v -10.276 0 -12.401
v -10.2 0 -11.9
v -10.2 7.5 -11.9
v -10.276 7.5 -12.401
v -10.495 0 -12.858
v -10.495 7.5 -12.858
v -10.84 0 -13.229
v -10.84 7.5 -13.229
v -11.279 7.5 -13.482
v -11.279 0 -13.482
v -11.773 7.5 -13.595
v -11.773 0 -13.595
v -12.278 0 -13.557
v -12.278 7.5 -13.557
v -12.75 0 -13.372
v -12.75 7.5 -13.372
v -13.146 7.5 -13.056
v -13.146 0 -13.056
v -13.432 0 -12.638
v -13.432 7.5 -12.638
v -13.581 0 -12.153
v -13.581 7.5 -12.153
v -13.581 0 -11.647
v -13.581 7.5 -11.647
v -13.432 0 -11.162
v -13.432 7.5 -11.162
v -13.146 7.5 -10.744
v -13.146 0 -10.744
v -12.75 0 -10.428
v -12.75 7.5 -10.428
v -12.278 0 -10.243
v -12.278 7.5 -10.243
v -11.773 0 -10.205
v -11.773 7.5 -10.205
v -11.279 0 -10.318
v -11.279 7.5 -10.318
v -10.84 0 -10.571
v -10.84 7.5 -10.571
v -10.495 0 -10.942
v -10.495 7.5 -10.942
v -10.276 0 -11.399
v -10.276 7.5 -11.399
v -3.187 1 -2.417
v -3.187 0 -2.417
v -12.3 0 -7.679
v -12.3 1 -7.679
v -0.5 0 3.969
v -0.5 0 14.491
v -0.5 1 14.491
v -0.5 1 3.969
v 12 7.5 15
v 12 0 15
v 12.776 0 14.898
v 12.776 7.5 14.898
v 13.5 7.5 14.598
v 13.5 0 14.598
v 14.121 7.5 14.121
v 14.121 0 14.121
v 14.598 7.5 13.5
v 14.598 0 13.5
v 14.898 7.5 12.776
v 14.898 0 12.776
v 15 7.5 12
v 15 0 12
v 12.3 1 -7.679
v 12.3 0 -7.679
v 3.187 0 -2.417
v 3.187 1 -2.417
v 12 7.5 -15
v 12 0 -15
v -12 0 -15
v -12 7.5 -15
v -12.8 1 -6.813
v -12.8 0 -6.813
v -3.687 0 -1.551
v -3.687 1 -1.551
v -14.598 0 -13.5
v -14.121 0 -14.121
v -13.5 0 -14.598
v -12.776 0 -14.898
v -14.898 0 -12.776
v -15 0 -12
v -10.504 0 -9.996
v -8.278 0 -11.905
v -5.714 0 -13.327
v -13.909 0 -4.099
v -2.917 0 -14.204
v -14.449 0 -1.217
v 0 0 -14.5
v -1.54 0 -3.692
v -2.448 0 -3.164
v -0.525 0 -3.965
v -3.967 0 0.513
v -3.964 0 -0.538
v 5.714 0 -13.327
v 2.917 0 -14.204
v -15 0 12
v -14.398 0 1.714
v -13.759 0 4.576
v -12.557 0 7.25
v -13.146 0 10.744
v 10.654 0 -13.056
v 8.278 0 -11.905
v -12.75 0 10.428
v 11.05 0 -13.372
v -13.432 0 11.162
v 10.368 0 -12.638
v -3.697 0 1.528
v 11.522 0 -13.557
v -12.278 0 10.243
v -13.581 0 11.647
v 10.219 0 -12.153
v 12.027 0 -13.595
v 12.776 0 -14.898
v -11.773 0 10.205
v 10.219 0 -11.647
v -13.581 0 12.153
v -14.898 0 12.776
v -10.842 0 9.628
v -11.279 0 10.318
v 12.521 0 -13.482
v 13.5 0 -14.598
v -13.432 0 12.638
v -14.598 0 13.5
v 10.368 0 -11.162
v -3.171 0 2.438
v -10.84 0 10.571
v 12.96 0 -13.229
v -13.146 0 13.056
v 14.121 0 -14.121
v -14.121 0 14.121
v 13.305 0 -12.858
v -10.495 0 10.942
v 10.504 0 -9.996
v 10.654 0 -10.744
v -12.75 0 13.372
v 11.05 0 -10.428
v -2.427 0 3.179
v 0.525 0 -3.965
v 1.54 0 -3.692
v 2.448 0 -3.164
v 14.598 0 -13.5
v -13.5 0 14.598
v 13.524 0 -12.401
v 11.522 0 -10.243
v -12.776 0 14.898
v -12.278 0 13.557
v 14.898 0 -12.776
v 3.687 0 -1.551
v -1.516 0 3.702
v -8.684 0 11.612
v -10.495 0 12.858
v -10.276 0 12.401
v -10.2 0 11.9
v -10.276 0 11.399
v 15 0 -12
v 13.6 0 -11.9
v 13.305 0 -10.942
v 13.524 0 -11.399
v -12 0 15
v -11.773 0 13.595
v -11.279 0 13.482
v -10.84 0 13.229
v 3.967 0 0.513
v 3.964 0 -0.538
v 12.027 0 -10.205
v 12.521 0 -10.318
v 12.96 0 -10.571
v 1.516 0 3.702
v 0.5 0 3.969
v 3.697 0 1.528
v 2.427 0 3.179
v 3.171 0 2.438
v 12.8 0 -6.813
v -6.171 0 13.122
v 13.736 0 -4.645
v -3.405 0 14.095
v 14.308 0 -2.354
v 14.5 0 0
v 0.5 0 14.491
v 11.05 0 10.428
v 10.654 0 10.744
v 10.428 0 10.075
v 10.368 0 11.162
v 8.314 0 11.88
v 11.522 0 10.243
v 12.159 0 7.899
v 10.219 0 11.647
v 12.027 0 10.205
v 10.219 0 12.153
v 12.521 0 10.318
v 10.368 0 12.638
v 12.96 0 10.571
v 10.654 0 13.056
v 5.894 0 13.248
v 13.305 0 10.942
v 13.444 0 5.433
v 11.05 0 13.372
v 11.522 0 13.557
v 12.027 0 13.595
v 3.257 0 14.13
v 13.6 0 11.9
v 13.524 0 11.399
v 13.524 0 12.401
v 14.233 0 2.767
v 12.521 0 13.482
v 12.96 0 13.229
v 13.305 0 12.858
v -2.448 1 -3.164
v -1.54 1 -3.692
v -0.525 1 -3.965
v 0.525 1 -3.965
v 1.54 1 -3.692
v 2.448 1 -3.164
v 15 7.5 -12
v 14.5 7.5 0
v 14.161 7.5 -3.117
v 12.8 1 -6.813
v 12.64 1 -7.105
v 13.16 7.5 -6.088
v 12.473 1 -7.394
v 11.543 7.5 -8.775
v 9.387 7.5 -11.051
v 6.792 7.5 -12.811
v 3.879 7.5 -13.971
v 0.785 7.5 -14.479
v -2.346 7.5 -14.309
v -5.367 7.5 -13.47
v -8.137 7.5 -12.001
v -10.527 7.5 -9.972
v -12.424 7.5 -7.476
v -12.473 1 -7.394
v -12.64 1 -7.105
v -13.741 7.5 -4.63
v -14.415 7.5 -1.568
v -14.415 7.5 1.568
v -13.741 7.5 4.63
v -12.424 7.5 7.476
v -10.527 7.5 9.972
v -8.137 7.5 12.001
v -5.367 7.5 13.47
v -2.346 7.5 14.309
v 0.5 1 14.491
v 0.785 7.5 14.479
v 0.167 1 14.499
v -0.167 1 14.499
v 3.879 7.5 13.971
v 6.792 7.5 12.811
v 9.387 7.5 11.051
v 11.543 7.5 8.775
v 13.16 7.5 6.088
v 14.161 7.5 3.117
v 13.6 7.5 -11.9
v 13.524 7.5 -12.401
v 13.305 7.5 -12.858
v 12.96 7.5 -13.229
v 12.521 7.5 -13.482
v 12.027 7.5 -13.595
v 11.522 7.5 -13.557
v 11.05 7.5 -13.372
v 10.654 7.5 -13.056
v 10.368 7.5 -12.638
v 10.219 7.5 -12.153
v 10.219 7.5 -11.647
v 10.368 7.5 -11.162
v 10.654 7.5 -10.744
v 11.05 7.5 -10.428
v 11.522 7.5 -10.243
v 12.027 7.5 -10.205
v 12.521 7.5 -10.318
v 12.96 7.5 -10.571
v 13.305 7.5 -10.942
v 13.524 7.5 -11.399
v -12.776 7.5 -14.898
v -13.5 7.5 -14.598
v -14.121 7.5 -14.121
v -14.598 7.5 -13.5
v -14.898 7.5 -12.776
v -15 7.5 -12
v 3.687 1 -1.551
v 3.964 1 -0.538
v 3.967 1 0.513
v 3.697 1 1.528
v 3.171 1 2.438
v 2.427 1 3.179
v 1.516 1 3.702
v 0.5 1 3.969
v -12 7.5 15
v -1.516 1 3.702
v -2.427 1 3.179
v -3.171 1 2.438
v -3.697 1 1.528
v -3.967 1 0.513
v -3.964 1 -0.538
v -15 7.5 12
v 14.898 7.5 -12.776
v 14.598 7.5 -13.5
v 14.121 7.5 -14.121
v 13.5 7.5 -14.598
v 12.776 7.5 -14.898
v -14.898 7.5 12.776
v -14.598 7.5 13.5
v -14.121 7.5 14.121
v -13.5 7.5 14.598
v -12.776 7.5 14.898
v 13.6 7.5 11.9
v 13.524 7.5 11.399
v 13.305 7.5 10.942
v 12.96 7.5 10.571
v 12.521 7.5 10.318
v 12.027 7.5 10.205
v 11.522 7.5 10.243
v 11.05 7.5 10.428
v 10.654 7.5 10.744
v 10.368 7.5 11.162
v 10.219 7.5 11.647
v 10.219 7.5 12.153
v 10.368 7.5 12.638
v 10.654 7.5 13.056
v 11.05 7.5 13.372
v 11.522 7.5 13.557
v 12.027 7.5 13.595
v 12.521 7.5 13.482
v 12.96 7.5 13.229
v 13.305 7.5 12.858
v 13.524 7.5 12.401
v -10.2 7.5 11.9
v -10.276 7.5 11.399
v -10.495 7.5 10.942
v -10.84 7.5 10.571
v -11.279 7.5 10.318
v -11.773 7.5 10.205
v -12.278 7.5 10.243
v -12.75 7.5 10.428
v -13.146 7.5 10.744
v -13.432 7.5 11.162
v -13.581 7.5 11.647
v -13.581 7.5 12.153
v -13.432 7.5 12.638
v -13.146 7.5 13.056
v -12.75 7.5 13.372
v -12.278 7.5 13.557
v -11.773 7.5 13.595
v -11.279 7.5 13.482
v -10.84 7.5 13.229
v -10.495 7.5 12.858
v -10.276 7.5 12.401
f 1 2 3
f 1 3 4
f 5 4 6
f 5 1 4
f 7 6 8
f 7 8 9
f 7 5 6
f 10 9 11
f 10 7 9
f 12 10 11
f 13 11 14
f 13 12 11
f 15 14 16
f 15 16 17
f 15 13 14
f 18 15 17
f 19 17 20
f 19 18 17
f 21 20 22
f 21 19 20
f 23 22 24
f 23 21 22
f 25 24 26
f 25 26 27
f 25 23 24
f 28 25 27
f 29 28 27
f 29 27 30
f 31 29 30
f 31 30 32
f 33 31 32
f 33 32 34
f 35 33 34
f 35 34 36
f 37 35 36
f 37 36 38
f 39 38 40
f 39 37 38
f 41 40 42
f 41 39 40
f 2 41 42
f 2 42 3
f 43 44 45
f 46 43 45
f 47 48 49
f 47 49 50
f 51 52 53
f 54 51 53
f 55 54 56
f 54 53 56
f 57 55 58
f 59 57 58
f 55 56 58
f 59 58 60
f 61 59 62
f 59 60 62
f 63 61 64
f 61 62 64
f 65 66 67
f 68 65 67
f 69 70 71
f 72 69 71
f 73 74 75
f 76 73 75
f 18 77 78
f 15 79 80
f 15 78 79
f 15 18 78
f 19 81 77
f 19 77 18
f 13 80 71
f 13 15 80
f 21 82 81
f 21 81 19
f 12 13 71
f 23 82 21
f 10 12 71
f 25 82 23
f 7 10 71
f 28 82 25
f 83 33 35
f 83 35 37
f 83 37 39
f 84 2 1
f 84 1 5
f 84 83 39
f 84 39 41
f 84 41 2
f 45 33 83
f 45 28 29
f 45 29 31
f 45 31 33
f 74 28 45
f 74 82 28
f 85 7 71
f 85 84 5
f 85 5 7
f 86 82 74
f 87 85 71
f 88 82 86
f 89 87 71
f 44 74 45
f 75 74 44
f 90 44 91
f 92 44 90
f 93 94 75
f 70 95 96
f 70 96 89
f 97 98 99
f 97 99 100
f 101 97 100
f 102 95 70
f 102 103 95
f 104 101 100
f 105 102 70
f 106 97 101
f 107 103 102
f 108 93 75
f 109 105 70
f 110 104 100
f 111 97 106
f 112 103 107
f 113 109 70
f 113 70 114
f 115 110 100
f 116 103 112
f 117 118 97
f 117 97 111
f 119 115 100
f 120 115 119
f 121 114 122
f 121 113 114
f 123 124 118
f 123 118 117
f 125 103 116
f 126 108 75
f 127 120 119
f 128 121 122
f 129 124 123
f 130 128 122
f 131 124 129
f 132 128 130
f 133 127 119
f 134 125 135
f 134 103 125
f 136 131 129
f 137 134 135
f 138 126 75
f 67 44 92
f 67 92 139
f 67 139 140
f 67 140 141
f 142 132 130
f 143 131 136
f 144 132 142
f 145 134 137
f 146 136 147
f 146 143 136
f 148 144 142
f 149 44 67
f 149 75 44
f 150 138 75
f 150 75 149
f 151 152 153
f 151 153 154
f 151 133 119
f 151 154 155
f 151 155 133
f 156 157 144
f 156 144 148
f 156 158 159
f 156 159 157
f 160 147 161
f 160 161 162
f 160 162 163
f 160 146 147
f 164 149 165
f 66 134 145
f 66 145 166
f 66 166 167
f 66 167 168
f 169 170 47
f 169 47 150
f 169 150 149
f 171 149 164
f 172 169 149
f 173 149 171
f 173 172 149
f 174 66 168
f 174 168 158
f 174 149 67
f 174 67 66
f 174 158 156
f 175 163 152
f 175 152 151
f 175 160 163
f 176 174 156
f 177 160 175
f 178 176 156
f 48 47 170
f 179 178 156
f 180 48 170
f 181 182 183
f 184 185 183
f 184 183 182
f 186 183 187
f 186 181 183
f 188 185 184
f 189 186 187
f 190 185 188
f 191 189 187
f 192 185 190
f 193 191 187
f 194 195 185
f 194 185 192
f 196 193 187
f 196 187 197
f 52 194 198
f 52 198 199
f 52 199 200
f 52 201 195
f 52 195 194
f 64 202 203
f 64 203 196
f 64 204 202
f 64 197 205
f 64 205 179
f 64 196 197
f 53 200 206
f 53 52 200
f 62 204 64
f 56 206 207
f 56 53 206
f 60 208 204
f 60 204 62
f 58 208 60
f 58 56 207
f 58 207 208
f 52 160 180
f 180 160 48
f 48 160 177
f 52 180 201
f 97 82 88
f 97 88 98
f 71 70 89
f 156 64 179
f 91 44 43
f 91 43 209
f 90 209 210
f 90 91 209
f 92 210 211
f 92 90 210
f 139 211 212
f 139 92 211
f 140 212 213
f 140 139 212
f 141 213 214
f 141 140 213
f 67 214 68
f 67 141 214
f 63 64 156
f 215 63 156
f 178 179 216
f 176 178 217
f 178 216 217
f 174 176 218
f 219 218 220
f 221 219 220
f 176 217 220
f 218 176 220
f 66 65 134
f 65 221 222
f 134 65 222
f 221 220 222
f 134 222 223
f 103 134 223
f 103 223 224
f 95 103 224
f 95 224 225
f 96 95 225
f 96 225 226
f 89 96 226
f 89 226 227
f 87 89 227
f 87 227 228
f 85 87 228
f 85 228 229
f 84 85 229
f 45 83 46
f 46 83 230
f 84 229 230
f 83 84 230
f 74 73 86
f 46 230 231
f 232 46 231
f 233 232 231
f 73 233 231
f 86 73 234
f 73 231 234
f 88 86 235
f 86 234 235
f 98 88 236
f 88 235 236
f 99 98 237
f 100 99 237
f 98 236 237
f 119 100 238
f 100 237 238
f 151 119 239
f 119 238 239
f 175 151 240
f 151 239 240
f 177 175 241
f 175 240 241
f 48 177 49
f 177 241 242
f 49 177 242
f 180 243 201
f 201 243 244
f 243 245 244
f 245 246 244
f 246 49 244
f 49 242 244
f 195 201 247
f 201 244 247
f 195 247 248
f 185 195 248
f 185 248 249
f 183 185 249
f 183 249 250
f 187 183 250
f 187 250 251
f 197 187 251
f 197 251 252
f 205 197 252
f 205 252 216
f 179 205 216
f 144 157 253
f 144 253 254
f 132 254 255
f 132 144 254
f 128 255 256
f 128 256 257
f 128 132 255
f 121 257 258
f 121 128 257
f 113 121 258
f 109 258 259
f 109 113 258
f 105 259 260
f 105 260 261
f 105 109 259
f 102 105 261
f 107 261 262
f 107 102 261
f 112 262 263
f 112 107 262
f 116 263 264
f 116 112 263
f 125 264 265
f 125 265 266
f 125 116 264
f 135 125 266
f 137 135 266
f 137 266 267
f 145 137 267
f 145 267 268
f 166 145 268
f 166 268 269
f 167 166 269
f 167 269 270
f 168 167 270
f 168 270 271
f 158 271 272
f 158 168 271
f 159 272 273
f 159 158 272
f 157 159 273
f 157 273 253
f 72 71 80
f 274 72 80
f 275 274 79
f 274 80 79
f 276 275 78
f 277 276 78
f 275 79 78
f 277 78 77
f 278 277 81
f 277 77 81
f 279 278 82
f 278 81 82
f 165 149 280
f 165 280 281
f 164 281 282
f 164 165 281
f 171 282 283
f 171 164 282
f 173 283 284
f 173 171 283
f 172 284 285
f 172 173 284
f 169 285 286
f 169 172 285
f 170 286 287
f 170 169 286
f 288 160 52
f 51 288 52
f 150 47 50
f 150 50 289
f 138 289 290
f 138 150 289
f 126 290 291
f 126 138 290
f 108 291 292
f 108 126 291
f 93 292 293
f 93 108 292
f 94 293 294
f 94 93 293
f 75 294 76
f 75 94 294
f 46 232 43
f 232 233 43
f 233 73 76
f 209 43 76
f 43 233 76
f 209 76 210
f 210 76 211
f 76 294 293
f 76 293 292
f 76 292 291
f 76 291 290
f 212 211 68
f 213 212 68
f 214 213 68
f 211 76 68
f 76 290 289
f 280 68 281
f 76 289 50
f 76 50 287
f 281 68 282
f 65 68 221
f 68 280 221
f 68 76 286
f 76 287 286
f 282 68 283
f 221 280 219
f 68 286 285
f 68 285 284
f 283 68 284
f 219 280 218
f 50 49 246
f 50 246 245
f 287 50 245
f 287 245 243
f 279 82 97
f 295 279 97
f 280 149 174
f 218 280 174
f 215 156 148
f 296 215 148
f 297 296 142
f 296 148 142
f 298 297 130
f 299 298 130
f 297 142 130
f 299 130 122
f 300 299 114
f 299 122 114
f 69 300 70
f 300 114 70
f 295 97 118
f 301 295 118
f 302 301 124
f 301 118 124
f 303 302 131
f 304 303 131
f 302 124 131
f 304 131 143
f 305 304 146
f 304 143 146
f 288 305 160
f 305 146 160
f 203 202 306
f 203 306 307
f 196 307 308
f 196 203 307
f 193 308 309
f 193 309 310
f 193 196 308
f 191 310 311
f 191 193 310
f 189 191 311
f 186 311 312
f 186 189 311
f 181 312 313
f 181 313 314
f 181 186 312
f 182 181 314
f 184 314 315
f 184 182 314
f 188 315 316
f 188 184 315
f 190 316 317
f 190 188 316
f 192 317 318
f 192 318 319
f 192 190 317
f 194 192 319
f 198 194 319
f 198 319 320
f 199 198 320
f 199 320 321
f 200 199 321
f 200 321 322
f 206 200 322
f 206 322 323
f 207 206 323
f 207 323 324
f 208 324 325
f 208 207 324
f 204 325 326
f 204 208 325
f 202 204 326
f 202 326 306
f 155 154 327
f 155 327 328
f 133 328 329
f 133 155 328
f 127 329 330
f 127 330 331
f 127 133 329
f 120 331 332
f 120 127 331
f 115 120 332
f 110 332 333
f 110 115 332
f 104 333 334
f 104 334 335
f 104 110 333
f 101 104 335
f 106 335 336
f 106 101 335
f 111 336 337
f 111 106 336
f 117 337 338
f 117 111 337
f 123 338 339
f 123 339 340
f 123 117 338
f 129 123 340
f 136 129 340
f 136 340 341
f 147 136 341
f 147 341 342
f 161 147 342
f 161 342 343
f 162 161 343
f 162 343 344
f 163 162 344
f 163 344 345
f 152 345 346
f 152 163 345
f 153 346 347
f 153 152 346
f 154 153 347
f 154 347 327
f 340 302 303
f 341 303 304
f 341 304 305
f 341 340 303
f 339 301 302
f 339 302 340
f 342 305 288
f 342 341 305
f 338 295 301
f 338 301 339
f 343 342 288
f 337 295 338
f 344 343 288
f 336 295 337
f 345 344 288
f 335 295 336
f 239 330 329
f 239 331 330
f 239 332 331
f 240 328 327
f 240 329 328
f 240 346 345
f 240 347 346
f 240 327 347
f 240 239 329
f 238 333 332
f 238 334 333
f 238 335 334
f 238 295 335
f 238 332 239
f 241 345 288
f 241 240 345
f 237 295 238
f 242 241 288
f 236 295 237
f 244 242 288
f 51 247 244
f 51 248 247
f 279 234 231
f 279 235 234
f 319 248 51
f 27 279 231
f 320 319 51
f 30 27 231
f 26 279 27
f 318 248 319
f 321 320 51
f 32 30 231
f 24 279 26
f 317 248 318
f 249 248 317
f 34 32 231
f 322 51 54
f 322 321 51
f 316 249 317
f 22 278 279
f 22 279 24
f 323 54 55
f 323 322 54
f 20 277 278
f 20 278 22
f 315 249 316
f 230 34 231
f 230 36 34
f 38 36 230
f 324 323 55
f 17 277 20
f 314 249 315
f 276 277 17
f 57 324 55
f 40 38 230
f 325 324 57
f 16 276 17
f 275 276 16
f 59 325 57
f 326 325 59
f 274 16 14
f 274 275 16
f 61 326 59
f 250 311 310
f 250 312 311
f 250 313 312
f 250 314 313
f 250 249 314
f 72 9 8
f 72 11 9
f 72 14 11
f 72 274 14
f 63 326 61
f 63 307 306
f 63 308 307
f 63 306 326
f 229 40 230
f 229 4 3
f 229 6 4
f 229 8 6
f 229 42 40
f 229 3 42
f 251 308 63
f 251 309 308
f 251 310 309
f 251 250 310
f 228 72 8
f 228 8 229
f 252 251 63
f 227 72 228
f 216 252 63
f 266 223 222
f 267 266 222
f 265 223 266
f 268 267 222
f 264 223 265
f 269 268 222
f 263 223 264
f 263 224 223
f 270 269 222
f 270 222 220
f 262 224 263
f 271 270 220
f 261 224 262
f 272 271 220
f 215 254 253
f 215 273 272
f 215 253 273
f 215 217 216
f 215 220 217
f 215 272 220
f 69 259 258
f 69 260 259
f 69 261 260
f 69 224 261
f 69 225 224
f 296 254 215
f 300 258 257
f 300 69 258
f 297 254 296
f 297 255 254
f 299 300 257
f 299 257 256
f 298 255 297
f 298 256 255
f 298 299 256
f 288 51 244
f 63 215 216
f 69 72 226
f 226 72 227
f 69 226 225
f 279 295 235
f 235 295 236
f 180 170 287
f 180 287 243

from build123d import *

# Parameters (mm, degrees)
SKETCH1_R           = 1.7
BOSS_EXTRUDE1_DEPTH = 7.5
SKETCH2_R           = 14.5
CUT_EXTRUDE1_DEPTH  = 7.5
SKETCH3_R           = 4
BOSS_EXTRUDE2_DEPTH = 1
BOSS_EXTRUDE3_DEPTH = 1


with BuildPart() as part:
    # Sketch1 → Boss-Extrude1 (new body)
    with BuildSketch(Plane(origin=(0, 0, 0), x_dir=(1, 0, 0), z_dir=(0, 1, 0))):
        with BuildLine():
            Line((-12, -15), (12, -15))
            ThreePointArc((12, -15), (14.121320344, -14.121320344), (15, -12))
            Line((15, -12), (15, 12))
            ThreePointArc((15, 12), (14.121320344, 14.121320344), (12, 15))
            Line((12, 15), (-12, 15))
            ThreePointArc((-12, 15), (-14.121320344, 14.121320344), (-15, 12))
            Line((-15, 12), (-15, -12))
            ThreePointArc((-15, -12), (-14.121320344, -14.121320344), (-12, -15))
        make_face()
        with Locations((-11.9, 11.9)):
            Circle(SKETCH1_R, mode=Mode.SUBTRACT)
        with Locations((11.9, 11.9)):
            Circle(SKETCH1_R, mode=Mode.SUBTRACT)
        with Locations((11.9, -11.9)):
            Circle(SKETCH1_R, mode=Mode.SUBTRACT)
        with Locations((-11.9, -11.9)):
            Circle(SKETCH1_R, mode=Mode.SUBTRACT)
    extrude(amount=BOSS_EXTRUDE1_DEPTH)

    # Sketch2 → Cut-Extrude1 (cut)
    with BuildSketch(Plane(origin=(0, 7.5, 0), x_dir=(1, 0, 0), z_dir=(0, 1, 0))):
        Circle(SKETCH2_R)
    extrude(amount=-CUT_EXTRUDE1_DEPTH, mode=Mode.SUBTRACT)



with BuildPart() as body_2:
    # Sketch3 → Boss-Extrude2 (new body)
    with BuildSketch(Plane.XZ):
        Circle(SKETCH3_R)
    extrude(amount=-BOSS_EXTRUDE2_DEPTH)


with BuildPart() as part_1:
    add(part.part)

    add(body_2.part)  # Boss-Extrude3 merges body 2
    # Sketch4 → Boss-Extrude3 (add)
    with BuildSketch(Plane.XZ):
        with BuildLine():
            Line((-0.5, 14.491376746), (-0.5, 3.968626967))
            ThreePointArc((-0.5, 3.968626967), (0, 4), (0.5, 3.968626967))
            Line((0.5, 3.968626967), (0.5, 14.491376746))
            ThreePointArc((0.5, 14.491376746), (0, 14.5), (-0.5, 14.491376746))
        make_face()
        with BuildLine():
            Line((12.299900398, -7.678701075), (3.186931771, -2.417326185))
            ThreePointArc((3.186931771, -2.417326185), (3.464101615, -2), (3.686931771, -1.551300781))
            Line((3.686931771, -1.551300781), (12.799900398, -6.812675671))
            ThreePointArc((12.799900398, -6.812675671), (12.557368355, -7.25), (12.299900398, -7.678701075))
        make_face()
        with BuildLine():
            Line((-12.799900398, -6.812675671), (-3.686931771, -1.551300781))
            ThreePointArc((-3.686931771, -1.551300781), (-3.464101615, -2), (-3.186931771, -2.417326185))
            Line((-3.186931771, -2.417326185), (-12.299900398, -7.678701075))
            ThreePointArc((-12.299900398, -7.678701075), (-12.557368355, -7.25), (-12.799900398, -6.812675671))
        make_face()
    extrude(amount=-BOSS_EXTRUDE3_DEPTH)


solid = part_1.part
